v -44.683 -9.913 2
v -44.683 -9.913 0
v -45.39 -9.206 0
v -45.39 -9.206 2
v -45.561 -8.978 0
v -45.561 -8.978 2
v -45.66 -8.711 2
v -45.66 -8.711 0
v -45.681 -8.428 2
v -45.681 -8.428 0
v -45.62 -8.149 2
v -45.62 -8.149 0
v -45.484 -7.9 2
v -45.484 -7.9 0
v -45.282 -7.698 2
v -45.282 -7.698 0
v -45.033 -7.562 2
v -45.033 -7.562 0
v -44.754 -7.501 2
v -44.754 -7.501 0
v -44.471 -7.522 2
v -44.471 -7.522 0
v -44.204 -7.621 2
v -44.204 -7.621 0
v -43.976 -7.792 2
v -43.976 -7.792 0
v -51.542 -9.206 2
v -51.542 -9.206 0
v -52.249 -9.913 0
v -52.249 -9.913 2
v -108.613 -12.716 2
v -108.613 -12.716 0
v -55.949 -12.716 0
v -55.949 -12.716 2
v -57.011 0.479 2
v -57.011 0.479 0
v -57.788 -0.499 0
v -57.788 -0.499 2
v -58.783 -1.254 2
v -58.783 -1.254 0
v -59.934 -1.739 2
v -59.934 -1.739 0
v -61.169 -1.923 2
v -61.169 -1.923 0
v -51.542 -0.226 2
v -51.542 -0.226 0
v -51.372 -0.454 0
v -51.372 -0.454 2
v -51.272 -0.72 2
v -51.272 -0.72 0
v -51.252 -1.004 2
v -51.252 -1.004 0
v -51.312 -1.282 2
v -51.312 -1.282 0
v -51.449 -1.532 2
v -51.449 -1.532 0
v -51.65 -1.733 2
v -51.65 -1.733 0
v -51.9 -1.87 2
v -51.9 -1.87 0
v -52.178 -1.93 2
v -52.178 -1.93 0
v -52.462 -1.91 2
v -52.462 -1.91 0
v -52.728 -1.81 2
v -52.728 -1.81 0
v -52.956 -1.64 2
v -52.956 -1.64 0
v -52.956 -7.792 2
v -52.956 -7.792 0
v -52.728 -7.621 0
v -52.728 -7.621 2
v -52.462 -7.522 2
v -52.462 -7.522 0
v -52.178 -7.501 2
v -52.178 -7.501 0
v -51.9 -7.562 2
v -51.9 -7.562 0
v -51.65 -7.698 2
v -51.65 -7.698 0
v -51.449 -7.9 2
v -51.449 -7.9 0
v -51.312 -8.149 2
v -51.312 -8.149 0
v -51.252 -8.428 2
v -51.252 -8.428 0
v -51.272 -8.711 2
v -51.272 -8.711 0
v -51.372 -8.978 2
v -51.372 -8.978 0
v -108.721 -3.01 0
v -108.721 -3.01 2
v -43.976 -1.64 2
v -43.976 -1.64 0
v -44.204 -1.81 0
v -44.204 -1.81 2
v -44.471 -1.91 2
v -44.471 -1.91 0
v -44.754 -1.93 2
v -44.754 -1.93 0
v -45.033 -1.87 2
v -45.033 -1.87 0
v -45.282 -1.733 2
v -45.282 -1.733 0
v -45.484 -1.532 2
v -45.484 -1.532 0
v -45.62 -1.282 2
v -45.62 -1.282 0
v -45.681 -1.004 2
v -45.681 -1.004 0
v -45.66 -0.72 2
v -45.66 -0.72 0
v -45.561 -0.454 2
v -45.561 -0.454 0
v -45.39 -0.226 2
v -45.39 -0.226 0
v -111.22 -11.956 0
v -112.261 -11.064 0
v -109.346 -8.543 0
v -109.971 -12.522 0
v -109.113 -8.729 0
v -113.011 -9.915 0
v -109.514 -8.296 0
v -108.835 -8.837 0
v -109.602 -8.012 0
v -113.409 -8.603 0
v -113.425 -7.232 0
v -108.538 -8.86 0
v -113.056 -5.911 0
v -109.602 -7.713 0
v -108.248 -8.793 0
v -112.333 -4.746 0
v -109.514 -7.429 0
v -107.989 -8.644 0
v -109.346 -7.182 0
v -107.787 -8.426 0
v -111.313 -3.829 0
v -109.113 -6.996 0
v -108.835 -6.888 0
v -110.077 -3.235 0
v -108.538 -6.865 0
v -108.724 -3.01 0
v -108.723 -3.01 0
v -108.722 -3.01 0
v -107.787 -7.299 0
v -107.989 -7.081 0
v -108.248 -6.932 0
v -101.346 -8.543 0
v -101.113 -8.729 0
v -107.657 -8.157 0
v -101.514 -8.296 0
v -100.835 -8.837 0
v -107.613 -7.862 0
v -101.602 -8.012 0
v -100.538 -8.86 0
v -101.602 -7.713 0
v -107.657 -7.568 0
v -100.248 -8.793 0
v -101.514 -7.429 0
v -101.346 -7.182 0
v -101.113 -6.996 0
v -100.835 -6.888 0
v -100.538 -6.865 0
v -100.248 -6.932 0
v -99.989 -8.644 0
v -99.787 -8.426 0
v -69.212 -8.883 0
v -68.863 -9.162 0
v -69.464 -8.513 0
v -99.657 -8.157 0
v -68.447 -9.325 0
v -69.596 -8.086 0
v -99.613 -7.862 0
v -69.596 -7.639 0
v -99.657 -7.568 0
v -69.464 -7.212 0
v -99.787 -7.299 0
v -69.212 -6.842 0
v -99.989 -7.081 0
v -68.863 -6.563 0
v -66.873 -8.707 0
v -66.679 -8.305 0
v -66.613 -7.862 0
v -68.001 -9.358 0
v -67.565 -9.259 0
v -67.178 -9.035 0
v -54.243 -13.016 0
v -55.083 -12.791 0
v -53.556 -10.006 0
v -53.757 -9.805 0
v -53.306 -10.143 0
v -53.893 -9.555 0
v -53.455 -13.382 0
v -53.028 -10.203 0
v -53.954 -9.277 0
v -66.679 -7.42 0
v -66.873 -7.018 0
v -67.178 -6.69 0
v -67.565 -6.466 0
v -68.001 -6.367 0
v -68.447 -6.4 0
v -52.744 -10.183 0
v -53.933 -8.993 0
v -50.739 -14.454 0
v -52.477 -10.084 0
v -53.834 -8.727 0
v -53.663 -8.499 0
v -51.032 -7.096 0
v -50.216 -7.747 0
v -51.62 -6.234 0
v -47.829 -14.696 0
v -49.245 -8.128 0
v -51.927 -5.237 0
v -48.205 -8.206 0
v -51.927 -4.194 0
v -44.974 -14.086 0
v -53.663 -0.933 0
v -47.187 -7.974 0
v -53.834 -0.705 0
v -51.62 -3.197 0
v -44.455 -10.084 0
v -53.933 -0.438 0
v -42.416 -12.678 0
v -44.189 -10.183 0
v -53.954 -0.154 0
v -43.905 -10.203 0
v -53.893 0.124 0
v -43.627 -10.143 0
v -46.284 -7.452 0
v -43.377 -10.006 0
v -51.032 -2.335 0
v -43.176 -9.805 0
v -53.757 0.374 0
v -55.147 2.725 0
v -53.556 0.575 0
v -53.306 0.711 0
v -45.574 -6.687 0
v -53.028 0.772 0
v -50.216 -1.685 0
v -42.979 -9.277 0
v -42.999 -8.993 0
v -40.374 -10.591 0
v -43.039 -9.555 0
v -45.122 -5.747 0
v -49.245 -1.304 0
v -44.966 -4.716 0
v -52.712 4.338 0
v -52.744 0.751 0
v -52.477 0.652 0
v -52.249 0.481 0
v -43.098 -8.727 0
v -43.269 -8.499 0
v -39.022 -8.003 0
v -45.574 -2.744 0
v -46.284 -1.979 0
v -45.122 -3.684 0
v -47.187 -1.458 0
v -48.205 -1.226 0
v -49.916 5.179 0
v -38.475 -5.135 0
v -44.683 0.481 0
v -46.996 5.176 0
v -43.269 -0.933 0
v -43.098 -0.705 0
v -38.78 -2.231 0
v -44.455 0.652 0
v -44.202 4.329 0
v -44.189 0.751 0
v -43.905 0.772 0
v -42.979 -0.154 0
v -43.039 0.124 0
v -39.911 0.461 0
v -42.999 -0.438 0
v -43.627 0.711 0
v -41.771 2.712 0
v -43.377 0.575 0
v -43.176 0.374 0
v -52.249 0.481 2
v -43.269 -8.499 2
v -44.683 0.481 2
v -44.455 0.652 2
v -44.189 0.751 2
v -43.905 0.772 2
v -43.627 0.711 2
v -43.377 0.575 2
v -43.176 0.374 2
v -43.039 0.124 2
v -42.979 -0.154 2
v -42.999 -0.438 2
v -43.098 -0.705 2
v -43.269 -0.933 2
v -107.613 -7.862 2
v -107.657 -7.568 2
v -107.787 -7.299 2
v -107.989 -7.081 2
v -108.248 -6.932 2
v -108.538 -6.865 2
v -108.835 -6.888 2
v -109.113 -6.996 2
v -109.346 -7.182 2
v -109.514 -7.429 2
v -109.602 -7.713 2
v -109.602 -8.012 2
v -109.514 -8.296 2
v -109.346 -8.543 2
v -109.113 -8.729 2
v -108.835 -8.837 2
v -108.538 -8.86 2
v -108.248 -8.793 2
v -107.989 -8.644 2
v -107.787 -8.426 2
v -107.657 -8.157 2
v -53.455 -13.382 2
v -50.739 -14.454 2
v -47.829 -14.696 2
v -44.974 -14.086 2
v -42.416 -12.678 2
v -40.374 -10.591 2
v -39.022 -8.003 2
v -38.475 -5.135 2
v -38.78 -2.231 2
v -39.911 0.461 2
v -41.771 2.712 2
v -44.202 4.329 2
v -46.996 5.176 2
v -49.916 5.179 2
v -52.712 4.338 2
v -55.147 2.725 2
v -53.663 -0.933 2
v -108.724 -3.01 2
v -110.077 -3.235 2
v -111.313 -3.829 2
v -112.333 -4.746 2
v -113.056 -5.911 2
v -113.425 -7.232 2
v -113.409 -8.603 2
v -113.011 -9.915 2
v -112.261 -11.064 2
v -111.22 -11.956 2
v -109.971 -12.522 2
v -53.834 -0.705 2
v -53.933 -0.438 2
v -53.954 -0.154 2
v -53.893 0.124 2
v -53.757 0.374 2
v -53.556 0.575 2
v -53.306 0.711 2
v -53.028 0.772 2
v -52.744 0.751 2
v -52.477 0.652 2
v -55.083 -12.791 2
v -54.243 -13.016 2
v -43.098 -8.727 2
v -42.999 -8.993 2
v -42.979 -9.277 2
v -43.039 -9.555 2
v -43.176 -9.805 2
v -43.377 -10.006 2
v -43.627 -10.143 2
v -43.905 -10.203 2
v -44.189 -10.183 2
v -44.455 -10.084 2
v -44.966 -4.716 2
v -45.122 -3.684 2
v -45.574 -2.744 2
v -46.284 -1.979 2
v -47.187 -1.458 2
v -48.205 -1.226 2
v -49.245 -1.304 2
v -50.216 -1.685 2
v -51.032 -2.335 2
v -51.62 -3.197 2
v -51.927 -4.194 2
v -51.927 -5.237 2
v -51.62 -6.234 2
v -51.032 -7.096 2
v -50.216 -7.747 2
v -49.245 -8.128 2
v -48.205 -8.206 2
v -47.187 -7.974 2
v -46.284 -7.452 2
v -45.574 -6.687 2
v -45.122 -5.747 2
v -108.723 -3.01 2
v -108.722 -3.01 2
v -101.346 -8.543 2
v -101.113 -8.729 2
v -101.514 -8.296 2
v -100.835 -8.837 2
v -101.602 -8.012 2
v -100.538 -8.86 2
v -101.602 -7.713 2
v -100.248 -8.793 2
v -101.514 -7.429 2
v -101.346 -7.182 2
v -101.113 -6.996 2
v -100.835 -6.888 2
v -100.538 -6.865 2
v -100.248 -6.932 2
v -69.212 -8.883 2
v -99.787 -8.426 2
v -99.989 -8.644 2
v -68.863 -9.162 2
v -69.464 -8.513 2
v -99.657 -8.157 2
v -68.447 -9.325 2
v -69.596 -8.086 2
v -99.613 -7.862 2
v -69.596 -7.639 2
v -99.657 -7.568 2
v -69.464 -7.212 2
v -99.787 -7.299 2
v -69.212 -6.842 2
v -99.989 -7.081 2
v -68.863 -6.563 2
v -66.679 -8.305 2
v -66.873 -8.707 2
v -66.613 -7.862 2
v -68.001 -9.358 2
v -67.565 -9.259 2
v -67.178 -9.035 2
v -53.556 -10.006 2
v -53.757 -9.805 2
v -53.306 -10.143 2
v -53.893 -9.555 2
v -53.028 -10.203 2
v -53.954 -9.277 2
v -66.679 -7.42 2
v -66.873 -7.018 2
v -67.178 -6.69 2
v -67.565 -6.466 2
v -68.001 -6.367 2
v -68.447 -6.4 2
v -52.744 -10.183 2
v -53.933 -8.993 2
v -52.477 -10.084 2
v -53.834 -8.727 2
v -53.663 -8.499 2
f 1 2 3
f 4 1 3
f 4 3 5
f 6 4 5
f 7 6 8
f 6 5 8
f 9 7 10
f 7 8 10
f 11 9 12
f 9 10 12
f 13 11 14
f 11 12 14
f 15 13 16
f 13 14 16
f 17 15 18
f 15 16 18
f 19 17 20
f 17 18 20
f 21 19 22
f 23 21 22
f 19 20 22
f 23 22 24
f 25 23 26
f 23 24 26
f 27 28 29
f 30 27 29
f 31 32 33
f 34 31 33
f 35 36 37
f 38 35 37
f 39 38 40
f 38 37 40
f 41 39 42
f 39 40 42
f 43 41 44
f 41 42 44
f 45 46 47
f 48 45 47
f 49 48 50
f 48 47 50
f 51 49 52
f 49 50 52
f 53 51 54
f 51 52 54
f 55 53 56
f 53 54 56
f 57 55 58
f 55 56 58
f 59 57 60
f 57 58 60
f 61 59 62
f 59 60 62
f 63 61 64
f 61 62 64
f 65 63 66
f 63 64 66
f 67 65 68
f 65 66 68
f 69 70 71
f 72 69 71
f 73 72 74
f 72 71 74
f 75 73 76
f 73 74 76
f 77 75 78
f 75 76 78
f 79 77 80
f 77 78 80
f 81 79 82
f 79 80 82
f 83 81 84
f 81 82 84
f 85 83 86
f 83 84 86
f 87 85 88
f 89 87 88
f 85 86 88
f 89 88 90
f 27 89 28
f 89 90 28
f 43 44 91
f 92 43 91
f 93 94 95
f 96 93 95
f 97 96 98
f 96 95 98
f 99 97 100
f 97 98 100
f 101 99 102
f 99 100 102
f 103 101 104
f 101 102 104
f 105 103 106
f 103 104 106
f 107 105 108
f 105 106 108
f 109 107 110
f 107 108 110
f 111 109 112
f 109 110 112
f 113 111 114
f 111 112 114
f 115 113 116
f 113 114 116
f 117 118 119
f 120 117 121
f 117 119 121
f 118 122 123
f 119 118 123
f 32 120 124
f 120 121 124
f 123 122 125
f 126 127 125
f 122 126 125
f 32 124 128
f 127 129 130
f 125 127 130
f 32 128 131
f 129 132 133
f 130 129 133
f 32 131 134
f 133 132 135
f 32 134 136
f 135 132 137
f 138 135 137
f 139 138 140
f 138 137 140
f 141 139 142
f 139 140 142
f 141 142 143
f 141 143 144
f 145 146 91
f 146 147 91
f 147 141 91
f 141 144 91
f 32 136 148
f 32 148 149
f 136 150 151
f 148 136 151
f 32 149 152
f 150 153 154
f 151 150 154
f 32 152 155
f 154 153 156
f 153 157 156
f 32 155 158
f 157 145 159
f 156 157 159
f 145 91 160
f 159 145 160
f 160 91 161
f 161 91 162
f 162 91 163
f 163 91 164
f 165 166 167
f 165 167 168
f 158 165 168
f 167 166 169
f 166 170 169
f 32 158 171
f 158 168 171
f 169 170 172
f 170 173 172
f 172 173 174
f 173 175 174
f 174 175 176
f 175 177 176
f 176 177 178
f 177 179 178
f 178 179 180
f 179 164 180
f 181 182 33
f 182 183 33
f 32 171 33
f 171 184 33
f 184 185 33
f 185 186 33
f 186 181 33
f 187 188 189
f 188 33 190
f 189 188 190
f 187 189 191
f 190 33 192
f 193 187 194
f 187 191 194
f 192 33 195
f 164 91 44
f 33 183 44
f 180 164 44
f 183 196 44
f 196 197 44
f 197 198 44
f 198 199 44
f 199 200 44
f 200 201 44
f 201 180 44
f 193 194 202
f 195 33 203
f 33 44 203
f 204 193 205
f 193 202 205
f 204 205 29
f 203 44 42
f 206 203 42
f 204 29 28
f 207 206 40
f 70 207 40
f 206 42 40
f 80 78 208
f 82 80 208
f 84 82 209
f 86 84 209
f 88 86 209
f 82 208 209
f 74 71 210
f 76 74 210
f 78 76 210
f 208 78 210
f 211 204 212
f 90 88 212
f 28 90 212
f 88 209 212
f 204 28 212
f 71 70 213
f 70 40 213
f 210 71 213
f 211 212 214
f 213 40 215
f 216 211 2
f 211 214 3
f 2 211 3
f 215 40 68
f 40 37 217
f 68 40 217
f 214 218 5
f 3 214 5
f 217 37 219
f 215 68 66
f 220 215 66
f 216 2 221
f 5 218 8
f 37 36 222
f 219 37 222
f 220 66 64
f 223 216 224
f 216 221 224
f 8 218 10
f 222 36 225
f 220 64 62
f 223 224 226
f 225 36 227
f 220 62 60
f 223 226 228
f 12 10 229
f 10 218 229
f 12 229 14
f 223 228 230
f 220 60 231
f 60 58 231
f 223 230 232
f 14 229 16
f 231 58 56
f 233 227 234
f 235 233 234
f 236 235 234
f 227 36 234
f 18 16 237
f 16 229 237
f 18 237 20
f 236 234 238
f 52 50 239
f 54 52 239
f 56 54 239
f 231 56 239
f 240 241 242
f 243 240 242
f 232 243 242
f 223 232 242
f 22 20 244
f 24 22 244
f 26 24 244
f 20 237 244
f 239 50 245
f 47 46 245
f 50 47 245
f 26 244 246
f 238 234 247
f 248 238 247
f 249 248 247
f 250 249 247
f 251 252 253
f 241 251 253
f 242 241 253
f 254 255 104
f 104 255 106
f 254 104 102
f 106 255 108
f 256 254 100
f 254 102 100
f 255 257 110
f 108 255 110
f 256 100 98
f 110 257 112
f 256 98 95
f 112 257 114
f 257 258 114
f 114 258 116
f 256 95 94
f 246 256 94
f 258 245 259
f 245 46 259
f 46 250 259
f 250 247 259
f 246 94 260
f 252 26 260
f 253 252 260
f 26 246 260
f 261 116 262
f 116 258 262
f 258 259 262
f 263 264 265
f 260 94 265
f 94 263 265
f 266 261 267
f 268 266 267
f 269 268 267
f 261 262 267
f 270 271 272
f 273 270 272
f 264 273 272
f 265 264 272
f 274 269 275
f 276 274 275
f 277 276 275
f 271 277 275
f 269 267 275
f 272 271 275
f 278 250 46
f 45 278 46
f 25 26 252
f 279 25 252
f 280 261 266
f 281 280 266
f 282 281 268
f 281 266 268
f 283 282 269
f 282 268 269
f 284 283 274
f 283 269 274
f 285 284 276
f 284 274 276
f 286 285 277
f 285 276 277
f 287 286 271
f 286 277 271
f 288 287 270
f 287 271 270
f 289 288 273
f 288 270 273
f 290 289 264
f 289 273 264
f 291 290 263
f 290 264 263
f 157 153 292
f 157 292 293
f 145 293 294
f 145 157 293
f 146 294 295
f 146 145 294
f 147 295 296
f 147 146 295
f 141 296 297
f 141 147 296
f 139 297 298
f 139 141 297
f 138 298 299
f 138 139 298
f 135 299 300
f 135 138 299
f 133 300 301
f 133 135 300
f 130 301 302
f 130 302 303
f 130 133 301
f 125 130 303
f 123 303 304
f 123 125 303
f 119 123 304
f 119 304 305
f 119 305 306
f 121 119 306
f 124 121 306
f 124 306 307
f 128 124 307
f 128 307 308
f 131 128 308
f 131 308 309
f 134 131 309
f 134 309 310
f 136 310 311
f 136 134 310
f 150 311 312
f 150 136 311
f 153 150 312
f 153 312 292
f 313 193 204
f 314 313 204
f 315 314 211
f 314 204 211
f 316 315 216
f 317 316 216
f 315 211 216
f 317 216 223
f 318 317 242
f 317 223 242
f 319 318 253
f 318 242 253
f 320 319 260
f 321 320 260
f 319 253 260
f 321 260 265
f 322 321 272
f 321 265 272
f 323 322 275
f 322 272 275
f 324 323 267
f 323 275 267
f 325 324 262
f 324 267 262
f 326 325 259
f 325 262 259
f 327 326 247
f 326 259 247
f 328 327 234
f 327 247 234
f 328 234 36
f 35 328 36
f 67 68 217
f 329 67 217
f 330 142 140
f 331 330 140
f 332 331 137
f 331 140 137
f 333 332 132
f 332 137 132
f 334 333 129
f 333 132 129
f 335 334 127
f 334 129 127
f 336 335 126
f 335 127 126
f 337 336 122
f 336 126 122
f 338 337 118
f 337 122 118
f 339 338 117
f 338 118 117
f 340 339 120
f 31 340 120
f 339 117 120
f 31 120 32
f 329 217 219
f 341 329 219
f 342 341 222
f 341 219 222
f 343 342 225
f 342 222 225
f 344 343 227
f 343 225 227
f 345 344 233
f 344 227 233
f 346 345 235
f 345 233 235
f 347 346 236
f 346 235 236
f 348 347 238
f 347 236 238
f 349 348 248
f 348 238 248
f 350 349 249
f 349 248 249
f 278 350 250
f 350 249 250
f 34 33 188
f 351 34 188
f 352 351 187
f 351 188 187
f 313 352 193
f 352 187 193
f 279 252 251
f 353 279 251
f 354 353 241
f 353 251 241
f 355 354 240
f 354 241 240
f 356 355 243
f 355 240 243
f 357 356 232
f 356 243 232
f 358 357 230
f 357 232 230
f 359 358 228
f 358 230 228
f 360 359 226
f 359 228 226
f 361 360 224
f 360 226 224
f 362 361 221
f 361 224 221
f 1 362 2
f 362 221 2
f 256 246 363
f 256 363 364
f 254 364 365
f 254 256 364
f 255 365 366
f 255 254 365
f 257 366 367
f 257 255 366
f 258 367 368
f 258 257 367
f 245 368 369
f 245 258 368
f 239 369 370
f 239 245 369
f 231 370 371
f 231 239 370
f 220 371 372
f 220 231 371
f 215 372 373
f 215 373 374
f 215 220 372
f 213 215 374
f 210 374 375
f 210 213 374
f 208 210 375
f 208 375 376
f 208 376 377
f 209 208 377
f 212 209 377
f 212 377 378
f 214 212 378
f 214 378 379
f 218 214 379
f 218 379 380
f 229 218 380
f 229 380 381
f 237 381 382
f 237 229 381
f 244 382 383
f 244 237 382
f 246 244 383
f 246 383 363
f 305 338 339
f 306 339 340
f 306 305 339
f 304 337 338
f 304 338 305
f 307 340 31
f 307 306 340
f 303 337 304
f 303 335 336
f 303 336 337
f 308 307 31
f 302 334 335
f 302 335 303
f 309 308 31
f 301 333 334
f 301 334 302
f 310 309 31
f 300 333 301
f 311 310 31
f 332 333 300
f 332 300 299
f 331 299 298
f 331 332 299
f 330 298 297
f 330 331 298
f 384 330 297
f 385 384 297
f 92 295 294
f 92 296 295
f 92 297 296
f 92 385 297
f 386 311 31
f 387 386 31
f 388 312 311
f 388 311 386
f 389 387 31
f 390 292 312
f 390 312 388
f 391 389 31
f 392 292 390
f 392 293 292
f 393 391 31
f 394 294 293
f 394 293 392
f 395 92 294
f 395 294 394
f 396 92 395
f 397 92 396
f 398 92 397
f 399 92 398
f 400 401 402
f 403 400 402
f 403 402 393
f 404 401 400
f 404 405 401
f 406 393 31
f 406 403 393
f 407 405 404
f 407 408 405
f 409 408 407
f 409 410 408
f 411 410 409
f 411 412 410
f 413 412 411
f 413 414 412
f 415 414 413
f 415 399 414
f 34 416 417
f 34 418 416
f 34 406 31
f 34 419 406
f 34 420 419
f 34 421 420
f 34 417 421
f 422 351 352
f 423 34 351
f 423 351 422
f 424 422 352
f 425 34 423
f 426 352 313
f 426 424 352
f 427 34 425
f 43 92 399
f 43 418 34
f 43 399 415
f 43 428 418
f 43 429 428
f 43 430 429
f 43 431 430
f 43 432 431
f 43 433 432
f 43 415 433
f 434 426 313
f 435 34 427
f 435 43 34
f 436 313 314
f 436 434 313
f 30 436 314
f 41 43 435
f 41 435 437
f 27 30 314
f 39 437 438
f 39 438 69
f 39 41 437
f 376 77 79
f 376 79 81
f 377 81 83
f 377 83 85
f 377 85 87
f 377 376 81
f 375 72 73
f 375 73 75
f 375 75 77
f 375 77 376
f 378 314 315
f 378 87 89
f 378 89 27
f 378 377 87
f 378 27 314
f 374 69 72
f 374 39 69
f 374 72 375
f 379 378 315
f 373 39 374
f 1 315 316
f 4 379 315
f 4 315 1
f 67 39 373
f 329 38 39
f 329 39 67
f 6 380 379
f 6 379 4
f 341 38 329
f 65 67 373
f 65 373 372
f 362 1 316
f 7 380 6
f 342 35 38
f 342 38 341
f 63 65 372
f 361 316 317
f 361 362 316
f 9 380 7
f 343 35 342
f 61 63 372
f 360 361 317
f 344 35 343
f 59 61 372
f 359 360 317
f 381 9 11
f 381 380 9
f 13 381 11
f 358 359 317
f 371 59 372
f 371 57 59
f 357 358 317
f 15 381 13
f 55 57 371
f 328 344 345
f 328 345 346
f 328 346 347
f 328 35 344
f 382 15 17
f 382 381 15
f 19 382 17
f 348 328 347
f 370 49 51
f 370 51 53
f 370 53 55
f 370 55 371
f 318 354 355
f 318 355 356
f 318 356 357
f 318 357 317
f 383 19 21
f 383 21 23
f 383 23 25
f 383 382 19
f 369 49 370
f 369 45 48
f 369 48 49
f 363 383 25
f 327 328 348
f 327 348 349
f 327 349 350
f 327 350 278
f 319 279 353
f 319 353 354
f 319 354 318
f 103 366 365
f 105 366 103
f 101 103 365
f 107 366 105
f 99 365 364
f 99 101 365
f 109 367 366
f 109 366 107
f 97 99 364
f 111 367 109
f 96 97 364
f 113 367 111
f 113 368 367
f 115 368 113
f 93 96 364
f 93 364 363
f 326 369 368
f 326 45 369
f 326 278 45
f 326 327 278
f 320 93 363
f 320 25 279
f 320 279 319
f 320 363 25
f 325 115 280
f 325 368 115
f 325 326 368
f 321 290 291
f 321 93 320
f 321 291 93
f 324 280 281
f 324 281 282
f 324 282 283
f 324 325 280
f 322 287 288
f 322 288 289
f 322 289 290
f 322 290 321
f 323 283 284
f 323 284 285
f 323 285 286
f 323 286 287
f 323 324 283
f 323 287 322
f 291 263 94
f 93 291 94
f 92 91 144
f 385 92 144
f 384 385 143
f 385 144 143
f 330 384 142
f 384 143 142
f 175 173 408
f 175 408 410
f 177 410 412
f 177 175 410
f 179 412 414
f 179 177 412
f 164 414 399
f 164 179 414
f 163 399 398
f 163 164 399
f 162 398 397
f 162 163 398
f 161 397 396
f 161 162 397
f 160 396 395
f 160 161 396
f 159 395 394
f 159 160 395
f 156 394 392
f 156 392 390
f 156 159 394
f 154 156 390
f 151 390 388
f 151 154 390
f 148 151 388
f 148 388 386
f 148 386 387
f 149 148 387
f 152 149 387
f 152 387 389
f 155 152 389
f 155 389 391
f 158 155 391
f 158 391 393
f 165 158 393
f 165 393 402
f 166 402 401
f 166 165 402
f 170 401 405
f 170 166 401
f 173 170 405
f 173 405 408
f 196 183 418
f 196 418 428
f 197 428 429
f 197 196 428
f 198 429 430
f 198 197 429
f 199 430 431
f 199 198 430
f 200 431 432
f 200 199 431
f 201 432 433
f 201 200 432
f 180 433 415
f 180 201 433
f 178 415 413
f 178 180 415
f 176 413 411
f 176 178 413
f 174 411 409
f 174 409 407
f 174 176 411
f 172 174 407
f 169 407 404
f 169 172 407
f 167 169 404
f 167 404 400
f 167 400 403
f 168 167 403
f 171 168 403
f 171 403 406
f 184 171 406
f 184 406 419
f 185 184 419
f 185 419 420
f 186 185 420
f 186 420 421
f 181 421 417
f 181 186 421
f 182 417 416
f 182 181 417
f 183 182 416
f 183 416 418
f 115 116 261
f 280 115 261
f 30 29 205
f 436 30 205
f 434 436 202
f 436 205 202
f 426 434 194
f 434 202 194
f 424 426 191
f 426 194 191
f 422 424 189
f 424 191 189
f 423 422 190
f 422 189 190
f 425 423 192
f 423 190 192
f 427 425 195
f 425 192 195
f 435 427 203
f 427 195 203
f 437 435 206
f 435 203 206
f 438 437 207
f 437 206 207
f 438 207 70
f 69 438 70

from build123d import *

# Parameters (mm, degrees)
F0_R     = 1
F0_R_2   = 1.5
F0_R_3   = 3.5
F1_DEPTH = 2


# Not quite as in the source:
# - ends of sketch curves that miss each other by under 0.0002 mm in the source are joined


with BuildPart() as f1:
    # F0 (on Top) → F1 (new body)
    with BuildSketch(Plane.XY):
        with BuildLine():
            ThreePointArc((-55.949488929, -12.7158224136), (-54.6584944803, -12.8853634982), (-53.4550506712, -13.3824890802))
            ThreePointArc((-53.4550506712, -13.3824890802), (-38.7798788654, -2.230730151), (-57.0112213811, 0.4786138322))
            ThreePointArc((-57.0112213811, 0.4786138322), (-58.7831707533, -1.2539634751), (-61.1694240668, -1.9228609466))
            Line((-61.1694240668, -1.9228609466), (-108.7206725135, -3.0103658035))
            ThreePointArc((-108.7206725135, -3.0103658035), (-108.7222436347, -3.0104019898), (-108.7238147676, -3.0104376674))
            ThreePointArc((-108.7238147676, -3.0104376674), (-113.4658569564, -7.9179829708), (-108.6128474049, -12.7158224136))
            Line((-108.6128474049, -12.7158224136), (-55.949488929, -12.7158224136))
        make_face()
        with Locations((-108.6128474049, -7.862495663)):
            Circle(F0_R, mode=Mode.SUBTRACT)
        with Locations((-100.6128474049, -7.862495663)):
            Circle(F0_R, mode=Mode.SUBTRACT)
        with Locations((-68.1128474049, -7.862495663)):
            Circle(F0_R_2, mode=Mode.SUBTRACT)
        with BuildLine():
            ThreePointArc((-52.2491954348, -9.9130572553), (-53.6634089972, -9.9130572553), (-53.6634089972, -8.4988436929))
            Line((-53.6634089972, -8.4988436929), (-52.956302216, -7.7917369117))
            ThreePointArc((-52.956302216, -7.7917369117), (-51.5420886536, -7.7917369117), (-51.5420886536, -9.2059504741))
            Line((-51.5420886536, -9.2059504741), (-52.2491954348, -9.9130572553))
        make_face(mode=Mode.SUBTRACT)
        with BuildLine():
            ThreePointArc((-43.2689393138, -8.4988436929), (-43.2689393138, -9.9130572553), (-44.6831528761, -9.9130572553))
            Line((-44.6831528761, -9.9130572553), (-45.3902596573, -9.2059504741))
            ThreePointArc((-45.3902596573, -9.2059504741), (-45.3902596573, -7.7917369117), (-43.9760460949, -7.7917369117))
            Line((-43.9760460949, -7.7917369117), (-43.2689393138, -8.4988436929))
        make_face(mode=Mode.SUBTRACT)
        with Locations((-48.4661741555, -4.7158224136)):
            Circle(F0_R_3, mode=Mode.SUBTRACT)
        with BuildLine():
            ThreePointArc((-53.6634089972, -0.9328011342), (-53.6634089972, 0.4814124282), (-52.2491954348, 0.4814124282))
            Line((-52.2491954348, 0.4814124282), (-51.5420886536, -0.225694353))
            ThreePointArc((-51.5420886536, -0.225694353), (-51.5420886536, -1.6399079154), (-52.956302216, -1.6399079154))
            Line((-52.956302216, -1.6399079154), (-53.6634089972, -0.9328011342))
        make_face(mode=Mode.SUBTRACT)
        with BuildLine():
            ThreePointArc((-43.9760460949, -1.6399079154), (-45.3902596573, -1.6399079154), (-45.3902596573, -0.225694353))
            Line((-45.3902596573, -0.225694353), (-44.6831528761, 0.4814124282))
            ThreePointArc((-44.6831528761, 0.4814124282), (-43.2689393138, 0.4814124282), (-43.2689393138, -0.9328011342))
            Line((-43.2689393138, -0.9328011342), (-43.9760460949, -1.6399079154))
        make_face(mode=Mode.SUBTRACT)
    extrude(amount=F1_DEPTH)


solid = f1.part
